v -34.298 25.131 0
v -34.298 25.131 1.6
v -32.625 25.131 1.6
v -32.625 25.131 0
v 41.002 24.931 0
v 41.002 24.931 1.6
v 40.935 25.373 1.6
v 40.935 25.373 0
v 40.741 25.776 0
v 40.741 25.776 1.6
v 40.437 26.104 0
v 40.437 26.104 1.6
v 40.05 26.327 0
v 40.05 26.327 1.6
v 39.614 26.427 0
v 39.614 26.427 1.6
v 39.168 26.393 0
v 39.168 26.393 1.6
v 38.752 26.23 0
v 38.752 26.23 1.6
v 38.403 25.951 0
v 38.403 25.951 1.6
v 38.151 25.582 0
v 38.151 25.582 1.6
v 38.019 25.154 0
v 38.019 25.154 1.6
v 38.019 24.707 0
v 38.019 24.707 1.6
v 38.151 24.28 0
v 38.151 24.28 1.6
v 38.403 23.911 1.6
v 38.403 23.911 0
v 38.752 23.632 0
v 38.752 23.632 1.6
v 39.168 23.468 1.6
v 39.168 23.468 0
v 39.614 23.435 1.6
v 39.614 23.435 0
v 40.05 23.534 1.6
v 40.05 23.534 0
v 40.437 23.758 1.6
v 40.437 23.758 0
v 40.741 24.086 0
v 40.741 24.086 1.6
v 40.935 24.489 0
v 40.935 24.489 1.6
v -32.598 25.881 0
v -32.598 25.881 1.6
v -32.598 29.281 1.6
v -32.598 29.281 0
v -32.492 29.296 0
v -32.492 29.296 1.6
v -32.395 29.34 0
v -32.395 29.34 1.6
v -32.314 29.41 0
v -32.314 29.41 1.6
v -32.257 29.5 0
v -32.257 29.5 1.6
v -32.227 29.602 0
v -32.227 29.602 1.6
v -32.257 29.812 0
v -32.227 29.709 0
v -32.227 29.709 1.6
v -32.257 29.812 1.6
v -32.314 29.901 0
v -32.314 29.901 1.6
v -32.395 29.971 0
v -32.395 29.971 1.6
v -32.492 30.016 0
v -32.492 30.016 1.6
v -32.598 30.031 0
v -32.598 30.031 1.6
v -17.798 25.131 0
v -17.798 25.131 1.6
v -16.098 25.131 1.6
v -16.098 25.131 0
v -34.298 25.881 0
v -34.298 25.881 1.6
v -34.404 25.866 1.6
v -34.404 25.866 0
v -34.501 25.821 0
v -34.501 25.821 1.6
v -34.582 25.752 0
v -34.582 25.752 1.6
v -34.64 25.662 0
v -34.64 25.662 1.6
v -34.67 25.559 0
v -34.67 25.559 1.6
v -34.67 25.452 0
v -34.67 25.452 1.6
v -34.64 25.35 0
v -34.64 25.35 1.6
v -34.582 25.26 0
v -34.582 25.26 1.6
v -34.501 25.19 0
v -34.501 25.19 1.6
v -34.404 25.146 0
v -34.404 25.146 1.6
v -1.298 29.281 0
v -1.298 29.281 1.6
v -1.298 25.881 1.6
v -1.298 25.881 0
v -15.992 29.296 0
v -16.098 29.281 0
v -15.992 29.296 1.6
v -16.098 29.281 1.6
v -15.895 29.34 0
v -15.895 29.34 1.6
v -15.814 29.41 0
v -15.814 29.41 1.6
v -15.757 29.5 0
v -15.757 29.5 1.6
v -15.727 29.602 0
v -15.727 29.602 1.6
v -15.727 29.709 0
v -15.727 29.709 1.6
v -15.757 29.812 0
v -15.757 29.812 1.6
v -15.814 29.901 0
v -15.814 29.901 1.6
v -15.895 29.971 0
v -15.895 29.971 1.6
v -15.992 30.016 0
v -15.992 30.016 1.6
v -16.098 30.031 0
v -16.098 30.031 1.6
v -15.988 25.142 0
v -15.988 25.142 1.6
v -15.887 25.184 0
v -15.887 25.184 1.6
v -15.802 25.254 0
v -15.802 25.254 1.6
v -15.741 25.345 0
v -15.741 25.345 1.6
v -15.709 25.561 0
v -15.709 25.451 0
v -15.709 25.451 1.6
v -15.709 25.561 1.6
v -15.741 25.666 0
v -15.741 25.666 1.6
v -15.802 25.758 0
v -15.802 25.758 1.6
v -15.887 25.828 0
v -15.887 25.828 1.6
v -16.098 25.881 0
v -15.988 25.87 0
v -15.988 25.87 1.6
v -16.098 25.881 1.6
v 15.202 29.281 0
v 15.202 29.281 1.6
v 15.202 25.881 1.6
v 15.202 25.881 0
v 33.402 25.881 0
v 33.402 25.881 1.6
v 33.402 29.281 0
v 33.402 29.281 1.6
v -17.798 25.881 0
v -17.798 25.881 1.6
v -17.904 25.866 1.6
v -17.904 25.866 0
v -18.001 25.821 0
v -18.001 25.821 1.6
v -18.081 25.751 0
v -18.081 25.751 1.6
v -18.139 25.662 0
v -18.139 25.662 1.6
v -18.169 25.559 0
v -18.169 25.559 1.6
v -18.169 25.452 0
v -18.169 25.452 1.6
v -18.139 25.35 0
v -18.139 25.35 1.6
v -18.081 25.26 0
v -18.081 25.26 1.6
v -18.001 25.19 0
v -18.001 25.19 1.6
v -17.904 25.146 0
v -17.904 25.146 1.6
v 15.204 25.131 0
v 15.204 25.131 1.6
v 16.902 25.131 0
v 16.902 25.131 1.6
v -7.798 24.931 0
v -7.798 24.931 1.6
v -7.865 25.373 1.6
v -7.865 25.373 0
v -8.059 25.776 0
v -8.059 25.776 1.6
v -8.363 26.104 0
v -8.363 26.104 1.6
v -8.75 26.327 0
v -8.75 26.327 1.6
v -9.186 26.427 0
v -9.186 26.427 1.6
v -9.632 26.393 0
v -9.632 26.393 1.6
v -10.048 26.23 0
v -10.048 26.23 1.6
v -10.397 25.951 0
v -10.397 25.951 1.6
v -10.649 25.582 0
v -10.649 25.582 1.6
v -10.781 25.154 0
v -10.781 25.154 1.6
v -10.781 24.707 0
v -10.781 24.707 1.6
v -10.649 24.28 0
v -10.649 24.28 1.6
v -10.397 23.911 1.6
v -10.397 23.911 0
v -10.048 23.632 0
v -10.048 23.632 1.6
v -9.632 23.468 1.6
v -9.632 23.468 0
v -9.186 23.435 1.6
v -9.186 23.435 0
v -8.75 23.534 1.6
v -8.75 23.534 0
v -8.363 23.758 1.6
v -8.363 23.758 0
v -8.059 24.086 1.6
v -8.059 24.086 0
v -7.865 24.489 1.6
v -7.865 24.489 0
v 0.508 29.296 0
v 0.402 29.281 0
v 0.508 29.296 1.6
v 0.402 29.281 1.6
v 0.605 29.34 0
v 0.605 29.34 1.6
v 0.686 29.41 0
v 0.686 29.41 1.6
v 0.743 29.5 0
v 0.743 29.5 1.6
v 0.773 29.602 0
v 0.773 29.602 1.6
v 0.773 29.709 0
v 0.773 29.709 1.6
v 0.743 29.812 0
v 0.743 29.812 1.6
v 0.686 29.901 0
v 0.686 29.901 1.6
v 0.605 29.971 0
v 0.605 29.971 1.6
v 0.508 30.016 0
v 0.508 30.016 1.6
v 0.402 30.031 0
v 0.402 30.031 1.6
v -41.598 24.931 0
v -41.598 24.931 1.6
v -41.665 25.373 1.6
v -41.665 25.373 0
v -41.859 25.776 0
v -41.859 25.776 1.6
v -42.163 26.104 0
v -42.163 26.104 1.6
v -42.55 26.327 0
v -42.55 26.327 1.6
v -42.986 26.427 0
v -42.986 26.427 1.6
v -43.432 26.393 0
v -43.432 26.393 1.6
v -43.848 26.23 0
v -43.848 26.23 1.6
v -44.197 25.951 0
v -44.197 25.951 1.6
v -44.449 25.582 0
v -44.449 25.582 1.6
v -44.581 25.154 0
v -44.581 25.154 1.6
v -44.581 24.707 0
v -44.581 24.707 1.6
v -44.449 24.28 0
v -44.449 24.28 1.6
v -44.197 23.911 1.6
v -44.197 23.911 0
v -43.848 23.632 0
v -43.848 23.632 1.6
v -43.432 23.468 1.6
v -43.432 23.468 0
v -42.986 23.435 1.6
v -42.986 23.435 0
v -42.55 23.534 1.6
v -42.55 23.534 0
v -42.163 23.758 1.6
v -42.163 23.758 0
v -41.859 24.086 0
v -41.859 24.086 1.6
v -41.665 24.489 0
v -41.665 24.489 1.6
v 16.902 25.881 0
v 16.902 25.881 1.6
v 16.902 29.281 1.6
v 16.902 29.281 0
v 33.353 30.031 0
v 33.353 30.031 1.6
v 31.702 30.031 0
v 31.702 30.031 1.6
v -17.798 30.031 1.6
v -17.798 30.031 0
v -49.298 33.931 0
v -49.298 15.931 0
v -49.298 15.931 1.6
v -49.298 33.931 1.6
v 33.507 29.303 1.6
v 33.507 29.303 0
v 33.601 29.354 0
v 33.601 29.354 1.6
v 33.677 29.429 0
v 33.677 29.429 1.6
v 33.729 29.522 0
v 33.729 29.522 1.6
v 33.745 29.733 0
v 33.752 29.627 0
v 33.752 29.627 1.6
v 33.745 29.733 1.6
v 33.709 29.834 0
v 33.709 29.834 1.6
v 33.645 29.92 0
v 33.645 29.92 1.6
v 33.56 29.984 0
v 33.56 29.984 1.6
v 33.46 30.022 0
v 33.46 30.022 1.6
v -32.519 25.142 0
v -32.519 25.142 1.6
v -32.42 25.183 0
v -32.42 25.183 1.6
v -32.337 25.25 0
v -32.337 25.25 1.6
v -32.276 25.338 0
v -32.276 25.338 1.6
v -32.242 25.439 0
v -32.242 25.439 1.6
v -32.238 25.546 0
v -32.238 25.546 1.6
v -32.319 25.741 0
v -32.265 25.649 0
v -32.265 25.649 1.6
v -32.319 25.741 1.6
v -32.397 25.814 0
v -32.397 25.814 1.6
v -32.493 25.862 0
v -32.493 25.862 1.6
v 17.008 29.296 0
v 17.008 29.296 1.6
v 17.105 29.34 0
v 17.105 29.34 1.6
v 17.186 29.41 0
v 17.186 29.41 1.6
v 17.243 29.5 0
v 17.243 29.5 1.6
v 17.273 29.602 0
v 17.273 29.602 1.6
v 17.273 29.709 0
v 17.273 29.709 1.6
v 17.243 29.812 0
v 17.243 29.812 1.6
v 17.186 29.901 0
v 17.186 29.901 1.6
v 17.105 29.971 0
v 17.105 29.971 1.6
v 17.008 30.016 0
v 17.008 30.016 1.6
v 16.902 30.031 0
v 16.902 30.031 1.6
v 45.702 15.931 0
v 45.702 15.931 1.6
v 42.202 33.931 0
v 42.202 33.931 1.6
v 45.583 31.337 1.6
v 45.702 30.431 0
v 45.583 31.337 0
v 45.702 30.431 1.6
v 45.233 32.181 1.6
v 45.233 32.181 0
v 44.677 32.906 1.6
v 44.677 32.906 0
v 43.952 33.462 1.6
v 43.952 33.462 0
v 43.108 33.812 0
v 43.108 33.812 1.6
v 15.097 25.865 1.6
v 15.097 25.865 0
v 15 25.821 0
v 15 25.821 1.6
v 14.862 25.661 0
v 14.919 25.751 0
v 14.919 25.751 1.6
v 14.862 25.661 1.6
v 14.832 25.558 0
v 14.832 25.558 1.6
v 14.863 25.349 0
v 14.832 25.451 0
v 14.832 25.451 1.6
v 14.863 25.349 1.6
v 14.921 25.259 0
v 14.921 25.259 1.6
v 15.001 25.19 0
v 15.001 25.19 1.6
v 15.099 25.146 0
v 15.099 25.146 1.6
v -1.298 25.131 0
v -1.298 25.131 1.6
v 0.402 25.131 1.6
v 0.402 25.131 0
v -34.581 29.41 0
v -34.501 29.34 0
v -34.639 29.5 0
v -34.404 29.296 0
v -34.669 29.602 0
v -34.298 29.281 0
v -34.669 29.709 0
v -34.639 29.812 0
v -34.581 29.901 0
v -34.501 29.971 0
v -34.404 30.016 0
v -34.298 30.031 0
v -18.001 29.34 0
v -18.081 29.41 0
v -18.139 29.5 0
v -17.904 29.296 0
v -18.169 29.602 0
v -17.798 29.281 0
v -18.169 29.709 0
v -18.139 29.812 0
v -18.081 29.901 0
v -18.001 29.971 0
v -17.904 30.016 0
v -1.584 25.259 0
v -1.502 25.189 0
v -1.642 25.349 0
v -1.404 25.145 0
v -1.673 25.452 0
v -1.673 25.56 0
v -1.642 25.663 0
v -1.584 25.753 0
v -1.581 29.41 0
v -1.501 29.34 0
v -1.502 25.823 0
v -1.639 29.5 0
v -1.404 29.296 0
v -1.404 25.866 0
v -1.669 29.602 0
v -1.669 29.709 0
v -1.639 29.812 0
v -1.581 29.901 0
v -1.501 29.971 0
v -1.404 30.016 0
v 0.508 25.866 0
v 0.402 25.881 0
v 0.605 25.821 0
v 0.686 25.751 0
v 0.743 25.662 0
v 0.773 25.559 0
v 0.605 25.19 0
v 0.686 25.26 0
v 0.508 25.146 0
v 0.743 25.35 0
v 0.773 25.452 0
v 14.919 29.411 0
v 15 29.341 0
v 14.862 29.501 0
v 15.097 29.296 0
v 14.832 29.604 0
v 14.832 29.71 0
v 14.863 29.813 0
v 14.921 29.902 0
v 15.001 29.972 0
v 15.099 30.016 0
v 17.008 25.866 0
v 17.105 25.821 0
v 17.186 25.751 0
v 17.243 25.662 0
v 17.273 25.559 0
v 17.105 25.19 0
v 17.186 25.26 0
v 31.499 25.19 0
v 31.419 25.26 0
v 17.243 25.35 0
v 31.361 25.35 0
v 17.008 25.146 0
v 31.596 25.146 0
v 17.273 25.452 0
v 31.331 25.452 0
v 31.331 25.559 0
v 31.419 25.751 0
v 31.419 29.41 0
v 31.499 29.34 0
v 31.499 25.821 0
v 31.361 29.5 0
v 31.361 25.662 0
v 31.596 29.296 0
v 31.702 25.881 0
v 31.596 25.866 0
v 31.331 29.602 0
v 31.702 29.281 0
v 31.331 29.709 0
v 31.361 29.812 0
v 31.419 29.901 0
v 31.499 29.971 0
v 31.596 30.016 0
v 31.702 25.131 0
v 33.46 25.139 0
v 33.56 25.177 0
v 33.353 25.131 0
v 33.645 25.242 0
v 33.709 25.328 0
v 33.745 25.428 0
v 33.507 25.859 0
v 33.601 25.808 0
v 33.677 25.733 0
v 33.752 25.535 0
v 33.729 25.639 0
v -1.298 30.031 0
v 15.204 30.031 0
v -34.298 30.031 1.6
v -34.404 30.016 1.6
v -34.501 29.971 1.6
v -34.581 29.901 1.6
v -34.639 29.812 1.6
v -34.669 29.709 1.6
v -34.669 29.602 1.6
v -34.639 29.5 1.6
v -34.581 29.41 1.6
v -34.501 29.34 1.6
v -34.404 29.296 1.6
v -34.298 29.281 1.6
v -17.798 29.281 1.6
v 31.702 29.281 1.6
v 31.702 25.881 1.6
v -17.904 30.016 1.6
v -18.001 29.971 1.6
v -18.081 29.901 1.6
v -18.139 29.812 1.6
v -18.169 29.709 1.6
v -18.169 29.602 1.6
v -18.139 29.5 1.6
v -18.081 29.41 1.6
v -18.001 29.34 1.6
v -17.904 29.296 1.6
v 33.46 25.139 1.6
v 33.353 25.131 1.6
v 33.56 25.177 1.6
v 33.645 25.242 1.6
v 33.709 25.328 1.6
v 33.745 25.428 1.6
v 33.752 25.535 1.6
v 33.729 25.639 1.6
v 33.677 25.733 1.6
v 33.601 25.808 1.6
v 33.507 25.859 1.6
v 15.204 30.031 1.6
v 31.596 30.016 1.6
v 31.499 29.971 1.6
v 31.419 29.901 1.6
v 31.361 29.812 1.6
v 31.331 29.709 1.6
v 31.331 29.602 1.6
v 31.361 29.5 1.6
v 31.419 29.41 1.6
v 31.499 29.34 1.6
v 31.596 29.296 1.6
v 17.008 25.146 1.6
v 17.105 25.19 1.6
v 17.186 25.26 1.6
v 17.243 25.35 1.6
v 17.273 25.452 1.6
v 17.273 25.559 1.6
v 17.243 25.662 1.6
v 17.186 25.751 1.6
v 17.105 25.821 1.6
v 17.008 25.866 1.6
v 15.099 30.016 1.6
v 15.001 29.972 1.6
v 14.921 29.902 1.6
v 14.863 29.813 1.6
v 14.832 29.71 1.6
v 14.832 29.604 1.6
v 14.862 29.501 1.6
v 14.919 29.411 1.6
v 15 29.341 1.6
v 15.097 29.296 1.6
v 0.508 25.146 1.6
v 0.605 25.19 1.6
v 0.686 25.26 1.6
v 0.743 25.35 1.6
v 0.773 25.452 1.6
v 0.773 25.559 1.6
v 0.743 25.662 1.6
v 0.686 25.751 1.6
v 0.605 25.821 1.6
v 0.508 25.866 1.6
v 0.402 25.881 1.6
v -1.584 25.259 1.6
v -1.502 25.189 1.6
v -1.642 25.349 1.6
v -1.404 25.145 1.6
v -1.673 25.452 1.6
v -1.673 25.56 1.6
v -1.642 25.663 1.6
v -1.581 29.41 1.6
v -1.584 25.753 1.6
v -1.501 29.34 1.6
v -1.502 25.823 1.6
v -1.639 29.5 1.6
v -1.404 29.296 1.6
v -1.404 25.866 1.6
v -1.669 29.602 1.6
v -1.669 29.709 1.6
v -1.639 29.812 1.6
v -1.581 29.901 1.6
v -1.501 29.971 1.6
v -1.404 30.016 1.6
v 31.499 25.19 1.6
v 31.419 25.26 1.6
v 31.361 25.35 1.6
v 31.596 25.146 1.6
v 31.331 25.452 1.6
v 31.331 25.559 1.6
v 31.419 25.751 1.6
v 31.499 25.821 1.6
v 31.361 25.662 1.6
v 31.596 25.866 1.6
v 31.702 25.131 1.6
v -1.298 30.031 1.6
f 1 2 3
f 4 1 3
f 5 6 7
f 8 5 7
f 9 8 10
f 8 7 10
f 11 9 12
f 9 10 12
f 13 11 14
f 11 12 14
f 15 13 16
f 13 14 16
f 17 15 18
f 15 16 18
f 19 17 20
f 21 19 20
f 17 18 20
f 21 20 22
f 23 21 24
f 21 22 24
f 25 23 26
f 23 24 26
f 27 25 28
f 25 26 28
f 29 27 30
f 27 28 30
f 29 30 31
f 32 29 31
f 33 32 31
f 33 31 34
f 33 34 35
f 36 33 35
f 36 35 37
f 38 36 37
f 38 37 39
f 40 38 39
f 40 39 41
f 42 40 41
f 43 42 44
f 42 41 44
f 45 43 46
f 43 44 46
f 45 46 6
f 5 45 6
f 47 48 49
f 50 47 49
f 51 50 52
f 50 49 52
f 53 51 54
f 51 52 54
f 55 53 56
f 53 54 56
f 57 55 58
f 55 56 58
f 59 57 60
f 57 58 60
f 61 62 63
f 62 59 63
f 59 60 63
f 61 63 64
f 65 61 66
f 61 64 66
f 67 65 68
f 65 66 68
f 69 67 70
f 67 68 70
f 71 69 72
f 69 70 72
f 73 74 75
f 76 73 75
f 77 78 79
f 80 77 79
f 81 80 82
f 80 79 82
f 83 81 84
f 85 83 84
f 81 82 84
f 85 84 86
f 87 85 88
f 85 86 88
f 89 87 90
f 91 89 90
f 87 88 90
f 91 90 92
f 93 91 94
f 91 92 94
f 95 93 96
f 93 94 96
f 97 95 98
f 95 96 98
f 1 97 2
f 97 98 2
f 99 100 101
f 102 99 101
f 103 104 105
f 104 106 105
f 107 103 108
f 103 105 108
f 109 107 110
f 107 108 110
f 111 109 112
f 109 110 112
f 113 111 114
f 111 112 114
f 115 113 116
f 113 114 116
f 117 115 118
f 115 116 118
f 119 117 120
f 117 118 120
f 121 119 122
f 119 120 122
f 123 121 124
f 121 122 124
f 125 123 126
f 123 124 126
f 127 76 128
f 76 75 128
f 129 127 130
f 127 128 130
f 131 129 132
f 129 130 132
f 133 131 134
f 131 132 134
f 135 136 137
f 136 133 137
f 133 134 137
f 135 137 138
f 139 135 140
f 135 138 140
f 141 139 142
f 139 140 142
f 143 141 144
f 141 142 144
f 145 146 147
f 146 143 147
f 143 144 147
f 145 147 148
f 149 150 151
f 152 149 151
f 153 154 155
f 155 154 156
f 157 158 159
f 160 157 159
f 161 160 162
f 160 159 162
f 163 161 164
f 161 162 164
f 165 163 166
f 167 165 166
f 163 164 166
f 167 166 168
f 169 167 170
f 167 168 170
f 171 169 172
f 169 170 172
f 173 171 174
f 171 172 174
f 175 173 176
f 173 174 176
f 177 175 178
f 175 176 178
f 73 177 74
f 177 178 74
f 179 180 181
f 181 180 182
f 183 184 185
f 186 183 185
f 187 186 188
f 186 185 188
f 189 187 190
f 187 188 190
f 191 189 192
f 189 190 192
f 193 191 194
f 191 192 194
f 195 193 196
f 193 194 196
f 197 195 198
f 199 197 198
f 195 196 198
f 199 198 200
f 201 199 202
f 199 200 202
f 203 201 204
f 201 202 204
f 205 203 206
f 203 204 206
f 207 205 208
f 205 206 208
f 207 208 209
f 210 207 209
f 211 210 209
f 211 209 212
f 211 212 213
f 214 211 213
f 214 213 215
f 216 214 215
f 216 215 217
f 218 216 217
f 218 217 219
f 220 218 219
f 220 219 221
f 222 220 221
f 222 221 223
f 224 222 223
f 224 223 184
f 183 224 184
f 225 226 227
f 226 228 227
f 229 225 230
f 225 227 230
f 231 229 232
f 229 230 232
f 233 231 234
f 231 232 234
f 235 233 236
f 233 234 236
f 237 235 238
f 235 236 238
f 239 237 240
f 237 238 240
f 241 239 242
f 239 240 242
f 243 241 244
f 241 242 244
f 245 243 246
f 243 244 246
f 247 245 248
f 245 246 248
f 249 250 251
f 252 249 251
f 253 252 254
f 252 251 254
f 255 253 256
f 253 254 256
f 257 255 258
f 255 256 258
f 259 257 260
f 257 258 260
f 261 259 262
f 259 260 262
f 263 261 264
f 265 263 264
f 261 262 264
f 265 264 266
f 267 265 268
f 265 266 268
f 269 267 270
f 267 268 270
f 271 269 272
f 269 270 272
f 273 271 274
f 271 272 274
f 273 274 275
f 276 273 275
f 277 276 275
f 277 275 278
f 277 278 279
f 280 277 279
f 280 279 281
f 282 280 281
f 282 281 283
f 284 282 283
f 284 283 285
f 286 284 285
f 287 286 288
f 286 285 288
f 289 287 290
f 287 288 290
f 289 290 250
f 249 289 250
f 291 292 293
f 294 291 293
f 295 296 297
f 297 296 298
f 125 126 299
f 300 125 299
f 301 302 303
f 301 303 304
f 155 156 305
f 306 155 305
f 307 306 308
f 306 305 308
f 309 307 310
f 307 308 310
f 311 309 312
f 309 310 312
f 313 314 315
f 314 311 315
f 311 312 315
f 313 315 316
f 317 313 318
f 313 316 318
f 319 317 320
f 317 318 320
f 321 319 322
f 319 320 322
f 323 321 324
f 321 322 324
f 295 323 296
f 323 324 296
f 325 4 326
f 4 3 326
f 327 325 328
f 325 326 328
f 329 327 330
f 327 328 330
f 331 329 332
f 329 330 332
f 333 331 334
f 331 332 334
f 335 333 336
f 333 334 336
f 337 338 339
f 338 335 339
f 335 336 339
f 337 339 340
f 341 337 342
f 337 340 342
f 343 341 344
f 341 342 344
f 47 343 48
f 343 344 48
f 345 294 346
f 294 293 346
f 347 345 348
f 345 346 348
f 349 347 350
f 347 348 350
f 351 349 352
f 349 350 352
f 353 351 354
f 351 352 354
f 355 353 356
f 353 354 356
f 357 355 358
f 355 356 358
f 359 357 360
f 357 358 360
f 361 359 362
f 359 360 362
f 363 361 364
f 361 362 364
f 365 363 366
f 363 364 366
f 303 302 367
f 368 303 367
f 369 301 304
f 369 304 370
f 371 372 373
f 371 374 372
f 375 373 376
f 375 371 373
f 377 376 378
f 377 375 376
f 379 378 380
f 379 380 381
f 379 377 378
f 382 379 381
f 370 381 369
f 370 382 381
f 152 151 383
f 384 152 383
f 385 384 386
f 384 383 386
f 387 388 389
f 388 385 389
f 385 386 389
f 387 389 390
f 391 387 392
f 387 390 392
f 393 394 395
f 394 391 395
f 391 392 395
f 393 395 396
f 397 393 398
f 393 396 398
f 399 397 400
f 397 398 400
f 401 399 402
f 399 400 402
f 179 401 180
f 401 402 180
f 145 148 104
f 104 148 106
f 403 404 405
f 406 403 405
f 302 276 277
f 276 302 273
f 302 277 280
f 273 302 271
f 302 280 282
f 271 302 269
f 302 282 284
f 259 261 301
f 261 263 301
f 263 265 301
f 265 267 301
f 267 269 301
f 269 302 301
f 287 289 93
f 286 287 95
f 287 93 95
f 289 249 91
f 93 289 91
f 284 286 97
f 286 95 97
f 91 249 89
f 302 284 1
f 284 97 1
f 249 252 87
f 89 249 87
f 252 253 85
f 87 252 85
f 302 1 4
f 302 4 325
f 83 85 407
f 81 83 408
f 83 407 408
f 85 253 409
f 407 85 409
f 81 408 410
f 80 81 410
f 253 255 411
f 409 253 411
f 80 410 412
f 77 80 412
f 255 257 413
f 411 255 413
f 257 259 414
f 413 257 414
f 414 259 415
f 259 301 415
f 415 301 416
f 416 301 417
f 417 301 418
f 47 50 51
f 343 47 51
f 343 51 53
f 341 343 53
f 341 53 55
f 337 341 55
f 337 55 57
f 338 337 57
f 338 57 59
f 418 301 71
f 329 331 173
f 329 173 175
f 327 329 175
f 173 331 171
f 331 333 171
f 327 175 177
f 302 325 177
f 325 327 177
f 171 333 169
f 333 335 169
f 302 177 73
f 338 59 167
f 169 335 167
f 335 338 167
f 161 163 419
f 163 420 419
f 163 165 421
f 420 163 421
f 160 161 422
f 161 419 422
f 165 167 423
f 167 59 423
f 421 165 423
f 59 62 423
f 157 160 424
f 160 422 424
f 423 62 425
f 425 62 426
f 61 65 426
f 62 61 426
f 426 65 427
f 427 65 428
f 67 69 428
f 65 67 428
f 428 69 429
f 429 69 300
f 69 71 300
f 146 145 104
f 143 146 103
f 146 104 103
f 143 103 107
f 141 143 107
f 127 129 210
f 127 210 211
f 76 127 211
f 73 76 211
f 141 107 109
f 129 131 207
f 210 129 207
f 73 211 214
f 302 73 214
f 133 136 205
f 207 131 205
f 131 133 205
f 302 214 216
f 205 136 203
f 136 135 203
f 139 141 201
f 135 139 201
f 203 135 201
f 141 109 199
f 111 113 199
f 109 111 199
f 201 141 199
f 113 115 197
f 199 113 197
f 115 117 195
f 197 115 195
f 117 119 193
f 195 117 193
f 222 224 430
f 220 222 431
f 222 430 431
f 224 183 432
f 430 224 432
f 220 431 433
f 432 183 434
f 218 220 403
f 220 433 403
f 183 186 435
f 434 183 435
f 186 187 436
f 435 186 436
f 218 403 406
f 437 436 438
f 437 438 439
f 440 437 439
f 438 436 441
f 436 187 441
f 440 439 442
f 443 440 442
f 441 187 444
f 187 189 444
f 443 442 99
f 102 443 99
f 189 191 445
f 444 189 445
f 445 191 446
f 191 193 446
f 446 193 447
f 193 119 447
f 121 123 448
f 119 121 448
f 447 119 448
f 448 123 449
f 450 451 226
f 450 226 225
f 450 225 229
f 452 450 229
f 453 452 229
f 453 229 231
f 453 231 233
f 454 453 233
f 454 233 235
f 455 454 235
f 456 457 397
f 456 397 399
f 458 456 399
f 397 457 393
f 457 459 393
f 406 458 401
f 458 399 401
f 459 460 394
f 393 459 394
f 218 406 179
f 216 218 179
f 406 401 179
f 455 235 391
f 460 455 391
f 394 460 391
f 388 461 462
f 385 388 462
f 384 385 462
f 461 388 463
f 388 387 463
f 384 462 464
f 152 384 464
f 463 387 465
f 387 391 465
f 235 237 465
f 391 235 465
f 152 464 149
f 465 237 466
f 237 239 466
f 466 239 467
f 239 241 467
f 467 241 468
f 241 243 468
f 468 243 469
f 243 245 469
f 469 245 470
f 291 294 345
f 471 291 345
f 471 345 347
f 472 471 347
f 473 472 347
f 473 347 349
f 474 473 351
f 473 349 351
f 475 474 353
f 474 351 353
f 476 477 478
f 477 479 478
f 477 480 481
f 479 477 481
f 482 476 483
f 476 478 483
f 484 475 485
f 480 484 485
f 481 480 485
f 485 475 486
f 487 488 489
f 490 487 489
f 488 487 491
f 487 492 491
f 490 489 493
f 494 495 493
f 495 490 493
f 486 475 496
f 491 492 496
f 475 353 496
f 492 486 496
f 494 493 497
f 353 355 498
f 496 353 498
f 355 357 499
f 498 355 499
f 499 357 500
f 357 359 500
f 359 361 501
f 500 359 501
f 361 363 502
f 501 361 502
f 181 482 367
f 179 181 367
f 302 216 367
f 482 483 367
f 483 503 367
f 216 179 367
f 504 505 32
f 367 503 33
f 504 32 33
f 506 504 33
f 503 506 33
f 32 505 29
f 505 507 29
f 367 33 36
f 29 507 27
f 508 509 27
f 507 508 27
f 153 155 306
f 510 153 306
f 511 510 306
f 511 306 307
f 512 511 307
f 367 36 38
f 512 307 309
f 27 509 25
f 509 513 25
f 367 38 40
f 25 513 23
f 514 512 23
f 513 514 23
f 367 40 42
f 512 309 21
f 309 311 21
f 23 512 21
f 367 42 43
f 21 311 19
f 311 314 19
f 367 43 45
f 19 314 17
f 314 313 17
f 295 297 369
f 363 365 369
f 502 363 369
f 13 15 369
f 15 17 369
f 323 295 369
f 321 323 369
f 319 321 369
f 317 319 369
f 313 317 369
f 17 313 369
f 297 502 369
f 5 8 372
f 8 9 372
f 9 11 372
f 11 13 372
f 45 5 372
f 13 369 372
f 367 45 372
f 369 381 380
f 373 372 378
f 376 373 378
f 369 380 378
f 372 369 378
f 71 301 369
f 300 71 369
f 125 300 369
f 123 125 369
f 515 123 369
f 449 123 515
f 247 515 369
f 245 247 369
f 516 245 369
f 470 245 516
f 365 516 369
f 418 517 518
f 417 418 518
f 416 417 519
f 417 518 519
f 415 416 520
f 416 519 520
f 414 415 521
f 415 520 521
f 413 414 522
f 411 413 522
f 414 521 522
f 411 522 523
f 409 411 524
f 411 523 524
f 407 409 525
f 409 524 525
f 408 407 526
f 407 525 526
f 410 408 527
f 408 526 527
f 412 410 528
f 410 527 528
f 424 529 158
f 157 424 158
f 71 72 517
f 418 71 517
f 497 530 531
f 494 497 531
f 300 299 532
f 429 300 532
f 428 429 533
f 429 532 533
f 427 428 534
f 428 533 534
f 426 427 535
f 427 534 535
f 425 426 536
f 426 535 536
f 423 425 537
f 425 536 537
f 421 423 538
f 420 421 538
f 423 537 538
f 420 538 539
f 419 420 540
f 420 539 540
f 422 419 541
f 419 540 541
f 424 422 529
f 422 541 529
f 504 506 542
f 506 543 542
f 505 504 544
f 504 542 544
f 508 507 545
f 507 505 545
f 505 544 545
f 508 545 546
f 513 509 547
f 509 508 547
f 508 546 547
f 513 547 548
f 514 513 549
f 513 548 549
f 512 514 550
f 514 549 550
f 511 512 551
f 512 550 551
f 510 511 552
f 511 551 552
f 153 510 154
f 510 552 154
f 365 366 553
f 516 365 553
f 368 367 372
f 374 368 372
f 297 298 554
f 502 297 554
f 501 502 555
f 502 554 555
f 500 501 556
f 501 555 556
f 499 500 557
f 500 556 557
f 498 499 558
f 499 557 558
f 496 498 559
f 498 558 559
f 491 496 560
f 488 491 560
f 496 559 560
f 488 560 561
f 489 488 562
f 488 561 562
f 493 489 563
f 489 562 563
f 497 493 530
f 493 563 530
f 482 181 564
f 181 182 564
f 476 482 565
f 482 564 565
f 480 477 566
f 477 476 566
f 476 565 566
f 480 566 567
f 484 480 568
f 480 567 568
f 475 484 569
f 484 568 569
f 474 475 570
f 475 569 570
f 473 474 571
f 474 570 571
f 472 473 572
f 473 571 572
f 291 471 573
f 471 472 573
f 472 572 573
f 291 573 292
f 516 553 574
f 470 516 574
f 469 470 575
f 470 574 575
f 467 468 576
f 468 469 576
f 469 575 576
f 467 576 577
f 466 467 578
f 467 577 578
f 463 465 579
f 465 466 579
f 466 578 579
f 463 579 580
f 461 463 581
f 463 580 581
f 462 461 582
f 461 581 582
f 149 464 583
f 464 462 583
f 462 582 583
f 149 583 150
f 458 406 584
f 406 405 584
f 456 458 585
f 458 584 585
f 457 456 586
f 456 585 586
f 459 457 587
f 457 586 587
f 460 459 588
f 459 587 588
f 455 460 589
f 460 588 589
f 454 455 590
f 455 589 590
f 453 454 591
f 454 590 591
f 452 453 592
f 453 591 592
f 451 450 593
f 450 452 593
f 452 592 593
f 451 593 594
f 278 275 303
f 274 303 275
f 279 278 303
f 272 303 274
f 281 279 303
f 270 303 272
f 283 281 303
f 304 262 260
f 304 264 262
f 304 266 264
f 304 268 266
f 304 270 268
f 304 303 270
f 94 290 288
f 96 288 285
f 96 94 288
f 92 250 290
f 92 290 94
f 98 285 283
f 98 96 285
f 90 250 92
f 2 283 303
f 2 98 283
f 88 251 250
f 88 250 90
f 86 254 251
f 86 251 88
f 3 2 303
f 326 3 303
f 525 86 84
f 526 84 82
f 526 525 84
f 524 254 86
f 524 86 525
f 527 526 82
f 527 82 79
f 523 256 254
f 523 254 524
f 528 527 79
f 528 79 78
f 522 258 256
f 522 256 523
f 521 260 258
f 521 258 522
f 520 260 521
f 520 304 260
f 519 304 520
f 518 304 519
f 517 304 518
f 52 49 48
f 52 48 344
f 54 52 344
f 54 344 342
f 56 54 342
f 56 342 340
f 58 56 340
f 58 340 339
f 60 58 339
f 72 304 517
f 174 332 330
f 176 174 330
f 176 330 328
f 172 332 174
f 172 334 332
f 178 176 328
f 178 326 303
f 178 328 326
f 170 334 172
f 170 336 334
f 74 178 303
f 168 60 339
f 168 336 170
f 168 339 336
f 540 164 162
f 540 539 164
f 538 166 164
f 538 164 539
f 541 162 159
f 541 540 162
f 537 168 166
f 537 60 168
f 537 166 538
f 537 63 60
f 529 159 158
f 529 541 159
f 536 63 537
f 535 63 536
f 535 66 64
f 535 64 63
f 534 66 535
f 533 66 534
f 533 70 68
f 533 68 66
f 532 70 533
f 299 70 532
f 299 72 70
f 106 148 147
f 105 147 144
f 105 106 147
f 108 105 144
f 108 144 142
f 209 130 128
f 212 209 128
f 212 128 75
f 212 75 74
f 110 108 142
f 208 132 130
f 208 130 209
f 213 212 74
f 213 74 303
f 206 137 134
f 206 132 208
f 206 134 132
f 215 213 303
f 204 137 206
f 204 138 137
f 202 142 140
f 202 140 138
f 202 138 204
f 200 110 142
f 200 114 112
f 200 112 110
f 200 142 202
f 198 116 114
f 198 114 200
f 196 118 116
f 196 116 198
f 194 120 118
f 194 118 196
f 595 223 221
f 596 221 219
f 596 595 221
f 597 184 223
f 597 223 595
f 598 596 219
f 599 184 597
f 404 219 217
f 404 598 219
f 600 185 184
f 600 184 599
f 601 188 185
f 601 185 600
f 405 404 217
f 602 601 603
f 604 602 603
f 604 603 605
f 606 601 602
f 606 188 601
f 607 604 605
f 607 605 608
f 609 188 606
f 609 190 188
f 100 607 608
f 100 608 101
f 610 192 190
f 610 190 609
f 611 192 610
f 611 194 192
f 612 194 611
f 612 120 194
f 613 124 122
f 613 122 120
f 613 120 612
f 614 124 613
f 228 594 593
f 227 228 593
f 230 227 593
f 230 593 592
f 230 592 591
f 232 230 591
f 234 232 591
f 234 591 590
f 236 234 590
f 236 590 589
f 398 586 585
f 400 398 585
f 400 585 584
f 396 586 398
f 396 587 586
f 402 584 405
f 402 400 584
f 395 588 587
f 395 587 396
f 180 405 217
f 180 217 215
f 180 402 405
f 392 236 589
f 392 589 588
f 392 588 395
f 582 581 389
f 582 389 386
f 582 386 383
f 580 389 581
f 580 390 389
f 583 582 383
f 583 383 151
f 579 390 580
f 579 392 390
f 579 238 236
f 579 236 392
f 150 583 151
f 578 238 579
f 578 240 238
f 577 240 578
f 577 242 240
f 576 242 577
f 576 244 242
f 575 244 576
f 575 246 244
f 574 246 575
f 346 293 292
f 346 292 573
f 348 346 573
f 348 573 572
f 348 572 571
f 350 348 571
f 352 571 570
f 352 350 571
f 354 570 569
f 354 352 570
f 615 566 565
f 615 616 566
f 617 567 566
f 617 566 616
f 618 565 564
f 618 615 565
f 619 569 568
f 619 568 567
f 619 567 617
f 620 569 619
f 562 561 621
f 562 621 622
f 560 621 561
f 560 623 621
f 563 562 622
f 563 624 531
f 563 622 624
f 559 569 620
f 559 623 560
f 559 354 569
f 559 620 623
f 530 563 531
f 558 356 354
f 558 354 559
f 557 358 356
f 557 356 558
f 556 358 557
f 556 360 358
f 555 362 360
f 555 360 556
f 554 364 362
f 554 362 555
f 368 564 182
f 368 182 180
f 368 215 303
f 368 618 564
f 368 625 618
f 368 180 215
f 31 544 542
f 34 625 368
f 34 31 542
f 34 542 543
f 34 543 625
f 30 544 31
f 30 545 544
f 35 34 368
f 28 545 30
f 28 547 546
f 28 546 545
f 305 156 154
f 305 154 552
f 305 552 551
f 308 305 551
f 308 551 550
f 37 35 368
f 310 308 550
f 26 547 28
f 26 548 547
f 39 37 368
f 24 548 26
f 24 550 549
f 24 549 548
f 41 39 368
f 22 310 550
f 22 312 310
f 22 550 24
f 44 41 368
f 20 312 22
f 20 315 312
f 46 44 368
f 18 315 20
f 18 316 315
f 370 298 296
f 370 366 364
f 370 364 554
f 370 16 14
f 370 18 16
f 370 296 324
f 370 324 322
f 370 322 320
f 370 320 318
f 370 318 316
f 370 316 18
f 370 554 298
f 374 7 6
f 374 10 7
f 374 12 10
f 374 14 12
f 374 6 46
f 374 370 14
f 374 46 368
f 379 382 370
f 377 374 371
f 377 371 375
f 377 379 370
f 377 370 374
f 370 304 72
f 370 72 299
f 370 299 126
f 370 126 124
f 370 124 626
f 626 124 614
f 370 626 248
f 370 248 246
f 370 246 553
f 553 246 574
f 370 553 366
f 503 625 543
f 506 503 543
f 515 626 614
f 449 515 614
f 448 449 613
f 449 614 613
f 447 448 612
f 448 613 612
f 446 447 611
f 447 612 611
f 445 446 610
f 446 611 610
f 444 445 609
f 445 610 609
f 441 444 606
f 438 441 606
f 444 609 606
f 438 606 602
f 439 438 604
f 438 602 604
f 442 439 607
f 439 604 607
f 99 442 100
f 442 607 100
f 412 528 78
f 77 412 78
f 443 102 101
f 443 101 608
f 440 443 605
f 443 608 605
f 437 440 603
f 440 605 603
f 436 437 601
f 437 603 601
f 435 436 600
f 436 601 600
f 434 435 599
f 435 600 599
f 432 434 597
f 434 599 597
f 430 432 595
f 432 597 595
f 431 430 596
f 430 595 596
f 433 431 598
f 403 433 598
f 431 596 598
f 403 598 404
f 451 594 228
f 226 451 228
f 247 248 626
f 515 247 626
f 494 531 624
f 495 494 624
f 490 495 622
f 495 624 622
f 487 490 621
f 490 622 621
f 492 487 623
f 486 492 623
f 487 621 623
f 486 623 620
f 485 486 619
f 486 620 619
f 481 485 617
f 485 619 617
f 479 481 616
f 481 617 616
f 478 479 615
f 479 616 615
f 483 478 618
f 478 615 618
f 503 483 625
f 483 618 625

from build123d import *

# Parameters (mm, degrees)
SZKIC1_W                    = 95
SZKIC1_H                    = 18
DODANIE_WYCI_GNI_CIE1_DEPTH = 1.6
GNIAZDO1_START              = -34.197888829
GNIAZDO1_OUTLINE_W          = 4.7
GNIAZDO1_OUTLINE_H          = 1.6
GNIAZDO1_DEPTH              = 1.6
GNIAZDO1_START_2            = -17.697888829
GNIAZDO1_2_OUTLINE_W        = 4.7
GNIAZDO1_2_OUTLINE_H        = 1.6
GNIAZDO1_2_DEPTH            = 1.6
GNIAZDO1_START_3            = -1.197888829
GNIAZDO1_3_OUTLINE_W        = 4.7
GNIAZDO1_3_OUTLINE_H        = 1.6
GNIAZDO1_3_DEPTH            = 1.6
GNIAZDO1_START_4            = 15.302111171
GNIAZDO1_4_OUTLINE_W        = 4.7
GNIAZDO1_4_OUTLINE_H        = 1.6
GNIAZDO1_4_DEPTH            = 1.6
GNIAZDO1_START_5            = 31.802111171
GNIAZDO1_5_OUTLINE_W        = 4.7
GNIAZDO1_5_OUTLINE_H        = 1.6
GNIAZDO1_5_DEPTH            = 1.6
WYTNIJ_WYCI_GNI_CIE2_DEPTH  = 1.6
ZAOKR_GLENIE1_R             = 3.5
SZKIC37_R                   = 1.5
WYTNIJ_WYCI_GNI_CIE3_DEPTH  = 1.6
SZKIC38_R                   = 1.5
WYTNIJ_WYCI_GNI_CIE4_DEPTH  = 60.867696542
SZKIC39_R                   = 0.375000457
SZKIC39_R_2                 = 0.375246396
SZKIC39_R_3                 = 0.375
SZKIC39_R_4                 = 0.375428794
SZKIC39_R_5                 = 0.37501816
SZKIC39_R_6                 = 0.375001619
SZKIC39_R_7                 = 0.375794755
WYTNIJ_WYCI_GNI_CIE5_DEPTH  = 1.6


# Read off the part's stored shape, not the designer's step: Gniazdo1
with BuildPart() as part:
    # Szkic1 → Dodanie-wyciągnięcie1 (new body)
    with BuildSketch(Plane.XY):
        with Locations((-1.797888829, 24.930800849)):
            Rectangle(SZKIC1_W, SZKIC1_H)
    extrude(amount=DODANIE_WYCI_GNI_CIE1_DEPTH)

    # Gniazdo1 outline → Gniazdo1 (cut)
    with BuildSketch(Plane.YZ.offset(GNIAZDO1_START)):
        with Locations((27.580800849, 0.8)):
            Rectangle(GNIAZDO1_OUTLINE_W, GNIAZDO1_OUTLINE_H)
    extrude(amount=GNIAZDO1_DEPTH, mode=Mode.SUBTRACT)

    # Gniazdo1 2 outline → Gniazdo1 2 (cut)
    with BuildSketch(Plane.YZ.offset(GNIAZDO1_START_2)):
        with Locations((27.580800849, 0.8)):
            Rectangle(GNIAZDO1_2_OUTLINE_W, GNIAZDO1_2_OUTLINE_H)
    extrude(amount=GNIAZDO1_2_DEPTH, mode=Mode.SUBTRACT)

    # Gniazdo1 3 outline → Gniazdo1 3 (cut)
    with BuildSketch(Plane.YZ.offset(GNIAZDO1_START_3)):
        with Locations((27.580800849, 0.8)):
            Rectangle(GNIAZDO1_3_OUTLINE_W, GNIAZDO1_3_OUTLINE_H)
    extrude(amount=GNIAZDO1_3_DEPTH, mode=Mode.SUBTRACT)

    # Gniazdo1 4 outline → Gniazdo1 4 (cut)
    with BuildSketch(Plane.YZ.offset(GNIAZDO1_START_4)):
        with Locations((27.580800849, 0.8)):
            Rectangle(GNIAZDO1_4_OUTLINE_W, GNIAZDO1_4_OUTLINE_H)
    extrude(amount=GNIAZDO1_4_DEPTH, mode=Mode.SUBTRACT)

    # Gniazdo1 5 outline → Gniazdo1 5 (cut)
    with BuildSketch(Plane.YZ.offset(GNIAZDO1_START_5)):
        with Locations((27.580800849, 0.8)):
            Rectangle(GNIAZDO1_5_OUTLINE_W, GNIAZDO1_5_OUTLINE_H)
    extrude(amount=GNIAZDO1_5_DEPTH, mode=Mode.SUBTRACT)

    # Szkic35 → Wytnij-wyciągnięcie2 (cut)
    with BuildSketch(Plane.XY.offset(1.6)):
        Polygon((-34.297888829, 30.030800849), (-34.297888829, 25.130800849), (-32.597888829, 25.130800849), (-32.597888829, 30.030800849), (-34.197888829, 30.030800849), align=None)
        Polygon((-17.797888829, 30.030800849), (-17.797888829, 25.130800849), (-16.097888829, 25.130800849), (-16.097888829, 30.030800849), (-17.697888829, 30.030800849), align=None)
        Polygon((-1.297888829, 30.030800849), (-1.297888829, 25.130800849), (0.402111171, 25.130800849), (0.402111171, 30.030800849), (-1.197888829, 30.030800849), align=None)
        Polygon((15.202111171, 30.030800849), (15.202111171, 25.130800849), (16.902111171, 25.130800849), (16.902111171, 30.030800849), (15.302111171, 30.030800849), align=None)
        Polygon((31.702111171, 30.030800849), (31.702111171, 25.130800849), (33.402111171, 25.130800849), (33.402111171, 30.030800849), (31.802111171, 30.030800849), align=None)
    extrude(amount=-WYTNIJ_WYCI_GNI_CIE2_DEPTH, mode=Mode.SUBTRACT)

    # Zaokrąglenie1
    zaokr_glenie1_edges = [part.edges().sort_by_distance(p)[0] for p in [
        (45.702111171, 33.930800849, 0.8),
    ]]
    fillet(zaokr_glenie1_edges, radius=ZAOKR_GLENIE1_R)

    # Szkic37 → Wytnij-wyciągnięcie3 (cut)
    with BuildSketch(Plane.XY.offset(1.6)):
        with Locations((39.502111171, 24.930800849)):
            Circle(SZKIC37_R)
        with Locations((-43.097888829, 24.930800849)):
            Circle(SZKIC37_R)
    extrude(amount=-WYTNIJ_WYCI_GNI_CIE3_DEPTH, mode=Mode.SUBTRACT)

    # Szkic38 → Wytnij-wyciągnięcie4 (cut, through all)
    with BuildSketch(Plane.XY.offset(1.6)):
        with Locations((-9.297888829, 24.930800849)):
            Circle(SZKIC38_R)
    extrude(amount=-WYTNIJ_WYCI_GNI_CIE4_DEPTH, mode=Mode.SUBTRACT)

    # Szkic39 → Wytnij-wyciągnięcie5 (cut)
    with BuildSketch(Plane.XY.offset(1.6)):
        with Locations((-34.298474307, 25.505800849)):
            Circle(SZKIC39_R)
        with Locations((-32.611485055, 25.505800849)):
            Circle(SZKIC39_R_2)
        with Locations((-17.797888829, 25.505800849)):
            Circle(SZKIC39_R_3)
        with Locations((-16.079950616, 25.505800849)):
            Circle(SZKIC39_R_4)
        with Locations((-1.301579386, 25.505800849)):
            Circle(SZKIC39_R_5)
        with Locations((0.402111171, 25.505800849)):
            Circle(SZKIC39_R_3)
        with Locations((15.203212962, 25.505800849)):
            Circle(SZKIC39_R_6)
        with Locations((16.902111171, 25.505800849)):
            Circle(SZKIC39_R_3)
        with Locations((31.702111171, 25.505800849)):
            Circle(SZKIC39_R_3)
        with Locations((33.377683776, 25.505800849)):
            Circle(SZKIC39_R_7)
        with Locations((-34.297888829, 29.655800849)):
            Circle(SZKIC39_R_3)
        with Locations((-32.597888829, 29.655800849)):
            Circle(SZKIC39_R_3)
        with Locations((-17.797888829, 29.655800849)):
            Circle(SZKIC39_R_3)
        with Locations((-16.097888829, 29.655800849)):
            Circle(SZKIC39_R_3)
        with Locations((-1.297888829, 29.655800849)):
            Circle(SZKIC39_R_3)
        with Locations((0.402111171, 29.655800849)):
            Circle(SZKIC39_R_3)
        with Locations((15.203212962, 29.655800849)):
            Circle(SZKIC39_R_6)
        with Locations((16.902111171, 29.655800849)):
            Circle(SZKIC39_R_3)
        with Locations((31.702111171, 29.655800849)):
            Circle(SZKIC39_R_3)
        with Locations((33.377683776, 29.655800849)):
            Circle(SZKIC39_R_7)
    extrude(amount=-WYTNIJ_WYCI_GNI_CIE5_DEPTH, mode=Mode.SUBTRACT)


solid = part.part
